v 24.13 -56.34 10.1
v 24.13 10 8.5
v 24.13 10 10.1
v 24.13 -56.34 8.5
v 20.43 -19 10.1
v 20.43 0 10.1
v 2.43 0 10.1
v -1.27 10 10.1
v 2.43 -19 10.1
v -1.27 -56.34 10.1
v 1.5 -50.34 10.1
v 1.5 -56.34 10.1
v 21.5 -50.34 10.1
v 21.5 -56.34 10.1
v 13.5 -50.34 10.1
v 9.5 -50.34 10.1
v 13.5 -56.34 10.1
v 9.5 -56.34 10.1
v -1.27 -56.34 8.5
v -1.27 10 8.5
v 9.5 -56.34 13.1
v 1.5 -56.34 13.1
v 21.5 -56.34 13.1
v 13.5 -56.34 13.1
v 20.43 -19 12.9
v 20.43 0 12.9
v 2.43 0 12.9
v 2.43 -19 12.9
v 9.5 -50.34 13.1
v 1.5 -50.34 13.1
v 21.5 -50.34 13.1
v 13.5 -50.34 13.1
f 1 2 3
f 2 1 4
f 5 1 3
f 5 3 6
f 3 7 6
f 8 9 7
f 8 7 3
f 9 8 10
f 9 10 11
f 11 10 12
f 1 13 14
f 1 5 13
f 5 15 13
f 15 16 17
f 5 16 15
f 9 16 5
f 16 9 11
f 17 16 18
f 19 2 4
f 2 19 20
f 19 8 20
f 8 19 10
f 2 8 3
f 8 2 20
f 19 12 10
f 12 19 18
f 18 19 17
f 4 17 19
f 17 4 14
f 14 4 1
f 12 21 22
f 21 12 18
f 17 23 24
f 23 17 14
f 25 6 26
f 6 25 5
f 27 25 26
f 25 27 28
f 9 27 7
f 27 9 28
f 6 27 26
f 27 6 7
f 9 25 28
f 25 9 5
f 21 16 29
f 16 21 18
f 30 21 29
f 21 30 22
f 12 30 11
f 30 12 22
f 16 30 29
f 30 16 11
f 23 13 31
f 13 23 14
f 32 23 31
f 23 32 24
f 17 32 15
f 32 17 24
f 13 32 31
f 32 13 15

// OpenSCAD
// Provisional envelope. 22.86mm row spacing and 8.5mm socket stack unmeasured.
translate([-1.27,-56.34,8.5]) cube([25.4,66.34,1.6]);
translate([2.43,-19,10.1]) cube([18,19,2.8]);
translate([1.5,-56.34,10.1]) cube([8,6,3]);
translate([13.5,-56.34,10.1]) cube([8,6,3]);
